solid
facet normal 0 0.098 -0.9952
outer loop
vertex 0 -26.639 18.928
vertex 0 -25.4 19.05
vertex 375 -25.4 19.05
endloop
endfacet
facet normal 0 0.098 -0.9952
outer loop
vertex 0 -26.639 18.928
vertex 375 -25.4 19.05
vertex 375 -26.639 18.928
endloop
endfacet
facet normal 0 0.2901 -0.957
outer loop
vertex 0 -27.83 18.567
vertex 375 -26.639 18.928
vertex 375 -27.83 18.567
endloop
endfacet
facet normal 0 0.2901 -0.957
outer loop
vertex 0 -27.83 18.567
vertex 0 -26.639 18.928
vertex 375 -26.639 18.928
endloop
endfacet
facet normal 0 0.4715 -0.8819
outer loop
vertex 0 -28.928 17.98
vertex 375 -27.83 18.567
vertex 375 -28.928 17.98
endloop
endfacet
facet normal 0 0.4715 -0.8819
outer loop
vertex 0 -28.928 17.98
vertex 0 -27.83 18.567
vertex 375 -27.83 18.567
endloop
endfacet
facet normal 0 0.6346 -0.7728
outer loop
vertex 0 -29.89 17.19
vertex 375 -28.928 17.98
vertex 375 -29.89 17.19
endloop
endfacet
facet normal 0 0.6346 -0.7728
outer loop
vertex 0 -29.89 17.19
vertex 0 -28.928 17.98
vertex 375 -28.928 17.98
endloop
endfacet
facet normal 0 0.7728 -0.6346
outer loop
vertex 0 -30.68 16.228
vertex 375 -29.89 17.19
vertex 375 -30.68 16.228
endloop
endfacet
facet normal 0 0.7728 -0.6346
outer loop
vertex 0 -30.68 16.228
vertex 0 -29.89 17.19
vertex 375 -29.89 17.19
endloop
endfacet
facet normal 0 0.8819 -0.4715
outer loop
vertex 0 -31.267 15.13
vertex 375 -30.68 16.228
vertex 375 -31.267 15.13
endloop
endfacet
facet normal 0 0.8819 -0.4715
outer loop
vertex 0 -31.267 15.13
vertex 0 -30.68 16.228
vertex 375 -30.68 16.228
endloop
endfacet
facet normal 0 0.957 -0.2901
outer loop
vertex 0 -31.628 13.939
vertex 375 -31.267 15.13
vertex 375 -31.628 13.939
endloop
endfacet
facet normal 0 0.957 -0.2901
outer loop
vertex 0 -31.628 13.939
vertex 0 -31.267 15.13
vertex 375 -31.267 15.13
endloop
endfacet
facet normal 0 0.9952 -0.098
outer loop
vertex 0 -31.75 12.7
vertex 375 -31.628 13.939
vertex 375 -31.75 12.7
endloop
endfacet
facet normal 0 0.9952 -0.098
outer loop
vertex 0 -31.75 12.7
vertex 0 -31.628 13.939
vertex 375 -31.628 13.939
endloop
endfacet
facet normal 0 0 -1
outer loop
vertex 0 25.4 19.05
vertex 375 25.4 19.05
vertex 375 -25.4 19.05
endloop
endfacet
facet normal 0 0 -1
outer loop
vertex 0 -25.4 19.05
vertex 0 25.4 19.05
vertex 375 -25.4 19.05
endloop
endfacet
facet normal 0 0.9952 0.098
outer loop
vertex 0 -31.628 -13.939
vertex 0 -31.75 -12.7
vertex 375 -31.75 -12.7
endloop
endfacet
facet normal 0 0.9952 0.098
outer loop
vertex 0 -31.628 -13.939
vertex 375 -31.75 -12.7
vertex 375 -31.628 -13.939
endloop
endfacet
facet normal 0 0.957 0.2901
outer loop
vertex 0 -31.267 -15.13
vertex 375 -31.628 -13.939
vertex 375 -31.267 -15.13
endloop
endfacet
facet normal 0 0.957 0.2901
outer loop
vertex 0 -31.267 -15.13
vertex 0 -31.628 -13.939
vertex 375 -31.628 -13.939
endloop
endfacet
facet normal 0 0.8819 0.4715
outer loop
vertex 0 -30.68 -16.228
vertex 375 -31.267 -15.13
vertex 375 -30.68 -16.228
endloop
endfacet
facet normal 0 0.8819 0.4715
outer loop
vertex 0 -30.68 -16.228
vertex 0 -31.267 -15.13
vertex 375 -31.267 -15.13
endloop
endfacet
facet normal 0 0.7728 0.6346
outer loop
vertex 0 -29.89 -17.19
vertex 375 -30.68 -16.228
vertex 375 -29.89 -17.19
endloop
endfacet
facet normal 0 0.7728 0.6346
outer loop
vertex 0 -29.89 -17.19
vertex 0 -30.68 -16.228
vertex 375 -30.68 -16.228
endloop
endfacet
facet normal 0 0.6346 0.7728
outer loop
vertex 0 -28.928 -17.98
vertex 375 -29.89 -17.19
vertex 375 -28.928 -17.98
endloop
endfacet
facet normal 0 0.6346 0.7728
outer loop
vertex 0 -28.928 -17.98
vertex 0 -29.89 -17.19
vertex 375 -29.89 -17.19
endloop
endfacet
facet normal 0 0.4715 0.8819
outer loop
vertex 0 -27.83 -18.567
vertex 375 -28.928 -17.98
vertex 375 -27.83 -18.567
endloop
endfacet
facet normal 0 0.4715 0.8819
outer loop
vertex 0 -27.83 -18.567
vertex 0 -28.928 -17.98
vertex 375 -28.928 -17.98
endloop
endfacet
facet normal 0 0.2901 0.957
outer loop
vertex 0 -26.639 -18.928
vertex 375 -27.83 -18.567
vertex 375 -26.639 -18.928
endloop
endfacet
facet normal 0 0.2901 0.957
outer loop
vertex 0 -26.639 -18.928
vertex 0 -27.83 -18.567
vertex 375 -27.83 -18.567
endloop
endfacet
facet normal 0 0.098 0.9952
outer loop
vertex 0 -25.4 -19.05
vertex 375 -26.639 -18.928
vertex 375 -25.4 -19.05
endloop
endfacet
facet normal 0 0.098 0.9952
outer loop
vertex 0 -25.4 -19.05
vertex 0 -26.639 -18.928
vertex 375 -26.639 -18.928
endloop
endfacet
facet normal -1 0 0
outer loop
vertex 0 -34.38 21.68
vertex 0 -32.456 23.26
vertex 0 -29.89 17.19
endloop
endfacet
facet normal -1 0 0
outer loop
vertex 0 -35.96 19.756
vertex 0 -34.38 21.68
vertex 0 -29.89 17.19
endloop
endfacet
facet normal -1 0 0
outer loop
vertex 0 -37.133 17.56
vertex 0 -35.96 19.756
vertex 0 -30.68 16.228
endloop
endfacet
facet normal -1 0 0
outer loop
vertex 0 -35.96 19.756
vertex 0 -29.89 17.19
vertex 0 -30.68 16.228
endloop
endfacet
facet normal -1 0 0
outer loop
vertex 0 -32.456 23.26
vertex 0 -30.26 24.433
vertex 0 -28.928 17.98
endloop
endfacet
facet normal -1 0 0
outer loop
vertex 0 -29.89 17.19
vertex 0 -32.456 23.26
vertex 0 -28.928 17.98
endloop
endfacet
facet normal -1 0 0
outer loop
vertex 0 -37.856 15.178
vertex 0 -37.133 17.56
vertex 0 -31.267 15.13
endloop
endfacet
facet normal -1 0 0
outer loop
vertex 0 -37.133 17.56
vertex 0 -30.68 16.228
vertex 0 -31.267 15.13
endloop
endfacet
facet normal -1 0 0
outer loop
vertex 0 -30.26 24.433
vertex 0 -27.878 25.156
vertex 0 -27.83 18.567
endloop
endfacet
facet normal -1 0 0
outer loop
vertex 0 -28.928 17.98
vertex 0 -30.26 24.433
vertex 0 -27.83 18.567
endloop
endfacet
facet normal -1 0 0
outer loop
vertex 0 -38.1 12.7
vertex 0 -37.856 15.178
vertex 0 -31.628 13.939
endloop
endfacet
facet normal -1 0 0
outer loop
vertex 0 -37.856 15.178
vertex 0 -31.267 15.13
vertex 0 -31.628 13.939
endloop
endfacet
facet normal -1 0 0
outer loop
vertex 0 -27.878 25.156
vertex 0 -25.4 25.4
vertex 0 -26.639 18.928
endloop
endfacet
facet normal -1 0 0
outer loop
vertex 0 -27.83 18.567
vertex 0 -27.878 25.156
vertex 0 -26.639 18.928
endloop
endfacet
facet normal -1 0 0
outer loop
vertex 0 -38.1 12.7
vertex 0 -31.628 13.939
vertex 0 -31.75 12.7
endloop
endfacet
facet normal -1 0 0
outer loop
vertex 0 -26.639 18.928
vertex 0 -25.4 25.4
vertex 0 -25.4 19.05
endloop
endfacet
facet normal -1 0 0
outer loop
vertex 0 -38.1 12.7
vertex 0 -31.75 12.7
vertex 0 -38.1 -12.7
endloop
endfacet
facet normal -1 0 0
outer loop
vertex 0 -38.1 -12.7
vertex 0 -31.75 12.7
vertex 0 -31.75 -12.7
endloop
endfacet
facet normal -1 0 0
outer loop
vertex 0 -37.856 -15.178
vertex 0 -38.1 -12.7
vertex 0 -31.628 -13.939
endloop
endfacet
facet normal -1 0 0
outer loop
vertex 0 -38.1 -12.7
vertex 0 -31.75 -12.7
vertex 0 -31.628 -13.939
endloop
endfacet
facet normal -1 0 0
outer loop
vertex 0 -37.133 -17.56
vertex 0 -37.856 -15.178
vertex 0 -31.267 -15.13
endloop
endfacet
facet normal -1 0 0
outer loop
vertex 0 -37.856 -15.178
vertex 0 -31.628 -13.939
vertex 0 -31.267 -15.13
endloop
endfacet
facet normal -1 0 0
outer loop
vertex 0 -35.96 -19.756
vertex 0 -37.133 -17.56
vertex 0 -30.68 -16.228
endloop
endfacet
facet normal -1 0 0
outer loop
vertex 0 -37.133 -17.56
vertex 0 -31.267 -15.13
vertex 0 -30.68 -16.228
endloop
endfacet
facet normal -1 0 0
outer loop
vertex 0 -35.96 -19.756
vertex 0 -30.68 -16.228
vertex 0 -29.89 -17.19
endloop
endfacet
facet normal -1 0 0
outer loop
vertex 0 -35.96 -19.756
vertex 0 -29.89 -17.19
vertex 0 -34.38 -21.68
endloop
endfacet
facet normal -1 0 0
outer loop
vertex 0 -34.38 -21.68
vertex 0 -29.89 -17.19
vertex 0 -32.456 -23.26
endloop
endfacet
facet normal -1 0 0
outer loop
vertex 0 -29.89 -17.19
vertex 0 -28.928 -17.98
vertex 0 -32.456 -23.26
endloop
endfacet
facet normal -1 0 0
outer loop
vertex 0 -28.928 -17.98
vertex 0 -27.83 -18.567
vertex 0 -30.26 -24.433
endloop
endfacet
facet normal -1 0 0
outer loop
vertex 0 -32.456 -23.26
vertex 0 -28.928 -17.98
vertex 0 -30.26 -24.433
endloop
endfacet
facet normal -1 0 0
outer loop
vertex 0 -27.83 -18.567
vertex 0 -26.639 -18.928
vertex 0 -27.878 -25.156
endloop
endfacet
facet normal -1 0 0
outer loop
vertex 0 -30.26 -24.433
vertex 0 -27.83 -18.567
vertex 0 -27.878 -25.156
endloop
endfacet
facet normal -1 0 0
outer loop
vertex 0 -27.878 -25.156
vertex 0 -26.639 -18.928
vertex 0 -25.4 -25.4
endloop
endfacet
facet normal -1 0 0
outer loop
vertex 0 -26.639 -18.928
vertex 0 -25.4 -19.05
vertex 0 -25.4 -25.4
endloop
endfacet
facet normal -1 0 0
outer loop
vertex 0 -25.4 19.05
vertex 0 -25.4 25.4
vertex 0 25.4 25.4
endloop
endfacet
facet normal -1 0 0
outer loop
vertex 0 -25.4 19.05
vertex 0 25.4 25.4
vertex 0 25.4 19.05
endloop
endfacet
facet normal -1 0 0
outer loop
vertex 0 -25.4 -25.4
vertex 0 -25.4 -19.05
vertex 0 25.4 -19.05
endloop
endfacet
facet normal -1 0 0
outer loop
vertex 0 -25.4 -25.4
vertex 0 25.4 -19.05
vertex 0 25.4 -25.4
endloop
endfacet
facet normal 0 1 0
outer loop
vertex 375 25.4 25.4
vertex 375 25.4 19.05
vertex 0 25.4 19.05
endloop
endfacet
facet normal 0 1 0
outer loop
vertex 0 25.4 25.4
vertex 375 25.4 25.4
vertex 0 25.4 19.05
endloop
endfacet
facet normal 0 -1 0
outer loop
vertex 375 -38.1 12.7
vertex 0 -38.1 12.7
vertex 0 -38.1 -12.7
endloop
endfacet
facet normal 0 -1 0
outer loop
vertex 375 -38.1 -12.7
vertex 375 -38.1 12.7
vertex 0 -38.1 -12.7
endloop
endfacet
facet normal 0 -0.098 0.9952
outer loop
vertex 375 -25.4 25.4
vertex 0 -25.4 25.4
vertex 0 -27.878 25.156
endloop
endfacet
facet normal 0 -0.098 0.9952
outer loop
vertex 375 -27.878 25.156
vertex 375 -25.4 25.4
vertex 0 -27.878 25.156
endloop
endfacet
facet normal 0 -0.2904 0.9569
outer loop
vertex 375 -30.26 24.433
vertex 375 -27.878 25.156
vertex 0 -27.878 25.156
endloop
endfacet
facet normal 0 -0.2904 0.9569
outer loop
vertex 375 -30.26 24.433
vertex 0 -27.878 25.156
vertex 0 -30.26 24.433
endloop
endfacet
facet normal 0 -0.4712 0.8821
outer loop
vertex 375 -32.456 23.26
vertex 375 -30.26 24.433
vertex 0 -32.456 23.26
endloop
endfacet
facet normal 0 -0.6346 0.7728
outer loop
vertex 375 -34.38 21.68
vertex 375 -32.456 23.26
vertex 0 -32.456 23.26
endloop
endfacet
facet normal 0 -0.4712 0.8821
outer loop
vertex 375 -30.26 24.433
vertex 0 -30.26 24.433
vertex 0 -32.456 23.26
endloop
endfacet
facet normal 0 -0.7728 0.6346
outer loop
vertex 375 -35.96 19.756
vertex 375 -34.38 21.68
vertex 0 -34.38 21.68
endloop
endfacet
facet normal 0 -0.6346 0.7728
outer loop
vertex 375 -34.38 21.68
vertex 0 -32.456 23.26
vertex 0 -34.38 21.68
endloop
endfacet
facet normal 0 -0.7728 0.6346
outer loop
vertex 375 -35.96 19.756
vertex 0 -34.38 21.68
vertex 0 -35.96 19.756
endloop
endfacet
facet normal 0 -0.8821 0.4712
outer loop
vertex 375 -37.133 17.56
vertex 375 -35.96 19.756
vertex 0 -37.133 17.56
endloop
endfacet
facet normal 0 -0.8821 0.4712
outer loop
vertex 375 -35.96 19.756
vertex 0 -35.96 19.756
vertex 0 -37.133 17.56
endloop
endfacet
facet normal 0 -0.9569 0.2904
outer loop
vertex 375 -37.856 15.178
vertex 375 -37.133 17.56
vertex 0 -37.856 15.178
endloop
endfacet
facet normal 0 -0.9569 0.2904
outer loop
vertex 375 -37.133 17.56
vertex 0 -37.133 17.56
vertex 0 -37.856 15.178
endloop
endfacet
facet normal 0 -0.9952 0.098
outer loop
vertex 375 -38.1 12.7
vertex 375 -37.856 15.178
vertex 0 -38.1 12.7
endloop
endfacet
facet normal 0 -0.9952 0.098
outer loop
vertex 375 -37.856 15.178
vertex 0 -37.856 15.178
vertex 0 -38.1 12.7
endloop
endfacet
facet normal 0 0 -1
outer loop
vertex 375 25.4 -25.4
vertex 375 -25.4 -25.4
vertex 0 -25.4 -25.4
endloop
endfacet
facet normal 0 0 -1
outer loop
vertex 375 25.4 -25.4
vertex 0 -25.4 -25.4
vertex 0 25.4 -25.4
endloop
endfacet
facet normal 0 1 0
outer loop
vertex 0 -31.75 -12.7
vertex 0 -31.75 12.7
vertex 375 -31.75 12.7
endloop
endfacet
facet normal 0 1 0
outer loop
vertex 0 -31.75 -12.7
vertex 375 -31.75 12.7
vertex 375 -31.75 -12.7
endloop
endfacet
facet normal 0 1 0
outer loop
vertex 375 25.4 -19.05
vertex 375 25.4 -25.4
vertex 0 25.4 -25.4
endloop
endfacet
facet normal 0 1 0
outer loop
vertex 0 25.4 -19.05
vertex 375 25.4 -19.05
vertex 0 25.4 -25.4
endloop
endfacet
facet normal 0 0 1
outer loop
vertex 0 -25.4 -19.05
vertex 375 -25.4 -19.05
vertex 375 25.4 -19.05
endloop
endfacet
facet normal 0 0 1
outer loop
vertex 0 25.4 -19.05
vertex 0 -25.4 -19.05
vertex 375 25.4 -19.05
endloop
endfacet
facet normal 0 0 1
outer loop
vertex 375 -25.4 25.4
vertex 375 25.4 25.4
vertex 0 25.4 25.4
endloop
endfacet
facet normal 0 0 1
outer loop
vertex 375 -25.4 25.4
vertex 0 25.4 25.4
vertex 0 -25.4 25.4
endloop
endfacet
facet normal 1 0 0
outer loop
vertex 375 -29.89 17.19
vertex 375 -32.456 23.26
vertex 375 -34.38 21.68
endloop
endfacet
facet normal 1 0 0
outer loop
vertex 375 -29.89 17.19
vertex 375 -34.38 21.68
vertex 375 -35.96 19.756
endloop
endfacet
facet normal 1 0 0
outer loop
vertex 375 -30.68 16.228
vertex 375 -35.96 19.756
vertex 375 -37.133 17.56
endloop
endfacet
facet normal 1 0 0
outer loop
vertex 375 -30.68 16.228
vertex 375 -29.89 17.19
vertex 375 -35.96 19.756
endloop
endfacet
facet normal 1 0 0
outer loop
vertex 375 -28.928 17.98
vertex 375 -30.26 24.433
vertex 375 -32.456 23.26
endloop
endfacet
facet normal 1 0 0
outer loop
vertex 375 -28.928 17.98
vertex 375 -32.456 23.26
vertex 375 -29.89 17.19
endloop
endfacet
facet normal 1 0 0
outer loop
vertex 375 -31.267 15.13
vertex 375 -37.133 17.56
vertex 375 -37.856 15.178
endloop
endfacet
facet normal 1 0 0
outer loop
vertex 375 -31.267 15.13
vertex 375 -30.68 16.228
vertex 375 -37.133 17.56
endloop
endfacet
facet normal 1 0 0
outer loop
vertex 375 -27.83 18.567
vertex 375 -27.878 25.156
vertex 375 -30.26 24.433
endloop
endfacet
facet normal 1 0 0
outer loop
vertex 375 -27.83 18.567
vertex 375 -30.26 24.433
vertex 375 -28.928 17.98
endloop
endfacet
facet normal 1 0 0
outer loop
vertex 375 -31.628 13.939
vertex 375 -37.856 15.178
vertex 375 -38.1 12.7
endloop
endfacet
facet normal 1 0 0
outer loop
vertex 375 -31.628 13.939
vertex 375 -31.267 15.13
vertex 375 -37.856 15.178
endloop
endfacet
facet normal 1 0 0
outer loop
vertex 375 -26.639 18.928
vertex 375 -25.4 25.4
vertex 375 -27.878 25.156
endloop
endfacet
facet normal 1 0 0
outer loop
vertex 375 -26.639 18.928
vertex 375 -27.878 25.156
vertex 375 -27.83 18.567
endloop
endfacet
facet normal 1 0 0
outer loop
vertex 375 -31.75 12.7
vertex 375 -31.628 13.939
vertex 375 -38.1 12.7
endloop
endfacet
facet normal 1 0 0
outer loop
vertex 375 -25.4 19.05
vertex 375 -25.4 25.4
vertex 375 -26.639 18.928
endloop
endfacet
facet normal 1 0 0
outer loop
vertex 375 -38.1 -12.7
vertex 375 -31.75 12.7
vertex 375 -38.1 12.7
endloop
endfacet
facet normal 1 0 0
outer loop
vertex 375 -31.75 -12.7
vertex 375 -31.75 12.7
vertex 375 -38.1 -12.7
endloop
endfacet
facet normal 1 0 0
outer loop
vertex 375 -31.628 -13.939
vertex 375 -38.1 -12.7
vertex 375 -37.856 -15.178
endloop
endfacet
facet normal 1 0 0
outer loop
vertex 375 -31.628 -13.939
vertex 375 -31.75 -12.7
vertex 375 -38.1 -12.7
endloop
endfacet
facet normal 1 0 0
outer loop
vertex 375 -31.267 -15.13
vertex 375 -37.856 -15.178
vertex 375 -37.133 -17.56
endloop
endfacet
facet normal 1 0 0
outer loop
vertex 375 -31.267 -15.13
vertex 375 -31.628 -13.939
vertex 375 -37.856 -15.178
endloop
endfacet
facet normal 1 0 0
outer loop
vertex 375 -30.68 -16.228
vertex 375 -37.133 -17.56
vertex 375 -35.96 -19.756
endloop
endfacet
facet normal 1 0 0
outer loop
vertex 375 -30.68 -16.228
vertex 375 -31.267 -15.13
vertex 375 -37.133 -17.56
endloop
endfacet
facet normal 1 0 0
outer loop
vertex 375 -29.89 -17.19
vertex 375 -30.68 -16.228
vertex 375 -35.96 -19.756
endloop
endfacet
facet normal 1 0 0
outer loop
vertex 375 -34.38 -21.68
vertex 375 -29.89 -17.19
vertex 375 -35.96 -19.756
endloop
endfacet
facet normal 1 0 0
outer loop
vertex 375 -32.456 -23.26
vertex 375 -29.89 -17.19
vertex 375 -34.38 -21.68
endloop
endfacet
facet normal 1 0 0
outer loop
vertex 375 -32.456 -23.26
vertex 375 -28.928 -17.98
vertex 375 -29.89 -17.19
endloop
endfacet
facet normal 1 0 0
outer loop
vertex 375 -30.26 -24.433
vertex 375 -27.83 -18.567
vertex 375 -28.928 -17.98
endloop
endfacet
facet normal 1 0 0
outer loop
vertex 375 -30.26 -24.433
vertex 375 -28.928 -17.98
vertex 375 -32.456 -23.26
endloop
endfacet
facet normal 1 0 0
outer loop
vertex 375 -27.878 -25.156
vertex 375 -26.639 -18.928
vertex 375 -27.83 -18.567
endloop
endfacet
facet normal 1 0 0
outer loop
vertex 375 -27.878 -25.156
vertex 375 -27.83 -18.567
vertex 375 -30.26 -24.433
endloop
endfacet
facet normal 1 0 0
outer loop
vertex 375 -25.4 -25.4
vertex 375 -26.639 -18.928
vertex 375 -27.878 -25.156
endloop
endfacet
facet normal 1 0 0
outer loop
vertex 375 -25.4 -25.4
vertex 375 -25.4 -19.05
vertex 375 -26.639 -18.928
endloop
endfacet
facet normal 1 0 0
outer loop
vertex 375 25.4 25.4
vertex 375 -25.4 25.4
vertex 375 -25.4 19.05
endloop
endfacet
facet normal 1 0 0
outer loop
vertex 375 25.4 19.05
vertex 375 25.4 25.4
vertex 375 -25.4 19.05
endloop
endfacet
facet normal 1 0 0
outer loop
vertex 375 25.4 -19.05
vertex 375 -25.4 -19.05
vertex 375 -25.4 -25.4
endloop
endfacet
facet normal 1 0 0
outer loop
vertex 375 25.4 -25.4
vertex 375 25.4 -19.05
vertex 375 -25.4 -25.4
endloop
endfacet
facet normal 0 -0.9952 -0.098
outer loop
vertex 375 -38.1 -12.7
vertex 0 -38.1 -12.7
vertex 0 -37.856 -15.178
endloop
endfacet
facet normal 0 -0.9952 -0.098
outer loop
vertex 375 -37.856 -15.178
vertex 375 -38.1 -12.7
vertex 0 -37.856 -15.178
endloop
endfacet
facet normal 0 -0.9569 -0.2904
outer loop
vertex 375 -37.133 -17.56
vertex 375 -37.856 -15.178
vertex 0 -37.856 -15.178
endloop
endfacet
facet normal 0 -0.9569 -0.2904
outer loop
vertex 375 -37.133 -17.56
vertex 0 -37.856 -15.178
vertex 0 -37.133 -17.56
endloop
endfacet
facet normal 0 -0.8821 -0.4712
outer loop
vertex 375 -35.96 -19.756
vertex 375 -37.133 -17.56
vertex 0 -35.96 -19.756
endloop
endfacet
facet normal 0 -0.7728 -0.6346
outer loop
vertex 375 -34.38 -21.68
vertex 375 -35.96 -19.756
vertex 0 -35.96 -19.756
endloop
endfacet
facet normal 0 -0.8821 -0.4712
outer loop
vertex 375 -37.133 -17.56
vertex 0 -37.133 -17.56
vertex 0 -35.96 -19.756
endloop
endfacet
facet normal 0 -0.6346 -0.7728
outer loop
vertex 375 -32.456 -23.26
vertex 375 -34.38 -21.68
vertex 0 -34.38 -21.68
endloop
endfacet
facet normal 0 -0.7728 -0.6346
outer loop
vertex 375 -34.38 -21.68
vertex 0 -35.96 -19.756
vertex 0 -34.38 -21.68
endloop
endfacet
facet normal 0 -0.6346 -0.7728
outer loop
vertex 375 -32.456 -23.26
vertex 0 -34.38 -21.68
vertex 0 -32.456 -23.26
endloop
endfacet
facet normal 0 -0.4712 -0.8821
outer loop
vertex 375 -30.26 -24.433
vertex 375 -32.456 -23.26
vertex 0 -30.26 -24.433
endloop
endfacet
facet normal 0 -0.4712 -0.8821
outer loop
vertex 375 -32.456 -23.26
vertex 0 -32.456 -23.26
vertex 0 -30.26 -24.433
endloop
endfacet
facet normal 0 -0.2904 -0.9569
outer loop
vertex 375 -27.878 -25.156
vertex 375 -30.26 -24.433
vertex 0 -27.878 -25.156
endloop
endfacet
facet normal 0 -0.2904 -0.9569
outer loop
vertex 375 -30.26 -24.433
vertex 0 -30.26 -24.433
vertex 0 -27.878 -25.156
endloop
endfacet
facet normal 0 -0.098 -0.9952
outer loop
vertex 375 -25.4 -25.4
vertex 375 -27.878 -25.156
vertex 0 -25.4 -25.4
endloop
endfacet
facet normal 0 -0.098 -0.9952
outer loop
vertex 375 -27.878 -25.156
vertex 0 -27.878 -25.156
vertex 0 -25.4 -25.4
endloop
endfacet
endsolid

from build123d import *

# Parameters (mm, degrees)
TUBO_RECTANGULAR_3_X_2_X_0_25_1_DEPTH = 375
CROQUIS3_W                            = 375
CROQUIS3_H                            = 12.7
CORTAR_EXTRUIR1_DEPTH                 = 78


with BuildPart() as part:
    # Sketch1 → Tubo rectangular 3 X 2 X 0.25(1) (new body)
    with BuildSketch(Plane(origin=(0, 0, 0), x_dir=(0, 0, -1), z_dir=(1, 0, 0))):
        with BuildLine():
            Line((-12.699978, -38.1), (12.699978, -38.1))
            ThreePointArc((12.699978, -38.1), (21.680234121, -34.380256121), (25.399978, -25.4))
            Line((25.399978, -25.4), (25.399978, 25.4))
            ThreePointArc((25.399978, 25.4), (21.680234121, 34.380256121), (12.699978, 38.1))
            Line((12.699978, 38.1), (-12.699978, 38.1))
            ThreePointArc((-12.699978, 38.1), (-21.680234121, 34.380256121), (-25.399978, 25.4))
            Line((-25.399978, 25.4), (-25.399978, -25.4))
            ThreePointArc((-25.399978, -25.4), (-21.680234121, -34.380256121), (-12.699978, -38.1))
        make_face()
        with BuildLine():
            Line((-12.699978, -31.75), (12.699978, -31.75))
            ThreePointArc((12.699978, -31.75), (17.190106061, -29.890128061), (19.049978, -25.4))
            Line((19.049978, -25.4), (19.049978, 25.4))
            ThreePointArc((19.049978, 25.4), (17.190106061, 29.890128061), (12.699978, 31.75))
            Line((12.699978, 31.75), (-12.699978, 31.75))
            ThreePointArc((-12.699978, 31.75), (-17.190106061, 29.890128061), (-19.049978, 25.4))
            Line((-19.049978, 25.4), (-19.049978, -25.4))
            ThreePointArc((-19.049978, -25.4), (-17.190106061, -29.890128061), (-12.699978, -31.75))
        make_face(mode=Mode.SUBTRACT)
    extrude(amount=TUBO_RECTANGULAR_3_X_2_X_0_25_1_DEPTH)

    # Croquis3 → Cortar-Extruir1 (cut)
    with BuildSketch(Plane(origin=(0, 0, -25.399978), x_dir=(-1, 0, 0), z_dir=(0, 0, -1))):
        with Locations((-187.5, 31.75)):
            Rectangle(CROQUIS3_W, CROQUIS3_H)
    extrude(amount=-CORTAR_EXTRUIR1_DEPTH, mode=Mode.SUBTRACT)


solid = part.part
